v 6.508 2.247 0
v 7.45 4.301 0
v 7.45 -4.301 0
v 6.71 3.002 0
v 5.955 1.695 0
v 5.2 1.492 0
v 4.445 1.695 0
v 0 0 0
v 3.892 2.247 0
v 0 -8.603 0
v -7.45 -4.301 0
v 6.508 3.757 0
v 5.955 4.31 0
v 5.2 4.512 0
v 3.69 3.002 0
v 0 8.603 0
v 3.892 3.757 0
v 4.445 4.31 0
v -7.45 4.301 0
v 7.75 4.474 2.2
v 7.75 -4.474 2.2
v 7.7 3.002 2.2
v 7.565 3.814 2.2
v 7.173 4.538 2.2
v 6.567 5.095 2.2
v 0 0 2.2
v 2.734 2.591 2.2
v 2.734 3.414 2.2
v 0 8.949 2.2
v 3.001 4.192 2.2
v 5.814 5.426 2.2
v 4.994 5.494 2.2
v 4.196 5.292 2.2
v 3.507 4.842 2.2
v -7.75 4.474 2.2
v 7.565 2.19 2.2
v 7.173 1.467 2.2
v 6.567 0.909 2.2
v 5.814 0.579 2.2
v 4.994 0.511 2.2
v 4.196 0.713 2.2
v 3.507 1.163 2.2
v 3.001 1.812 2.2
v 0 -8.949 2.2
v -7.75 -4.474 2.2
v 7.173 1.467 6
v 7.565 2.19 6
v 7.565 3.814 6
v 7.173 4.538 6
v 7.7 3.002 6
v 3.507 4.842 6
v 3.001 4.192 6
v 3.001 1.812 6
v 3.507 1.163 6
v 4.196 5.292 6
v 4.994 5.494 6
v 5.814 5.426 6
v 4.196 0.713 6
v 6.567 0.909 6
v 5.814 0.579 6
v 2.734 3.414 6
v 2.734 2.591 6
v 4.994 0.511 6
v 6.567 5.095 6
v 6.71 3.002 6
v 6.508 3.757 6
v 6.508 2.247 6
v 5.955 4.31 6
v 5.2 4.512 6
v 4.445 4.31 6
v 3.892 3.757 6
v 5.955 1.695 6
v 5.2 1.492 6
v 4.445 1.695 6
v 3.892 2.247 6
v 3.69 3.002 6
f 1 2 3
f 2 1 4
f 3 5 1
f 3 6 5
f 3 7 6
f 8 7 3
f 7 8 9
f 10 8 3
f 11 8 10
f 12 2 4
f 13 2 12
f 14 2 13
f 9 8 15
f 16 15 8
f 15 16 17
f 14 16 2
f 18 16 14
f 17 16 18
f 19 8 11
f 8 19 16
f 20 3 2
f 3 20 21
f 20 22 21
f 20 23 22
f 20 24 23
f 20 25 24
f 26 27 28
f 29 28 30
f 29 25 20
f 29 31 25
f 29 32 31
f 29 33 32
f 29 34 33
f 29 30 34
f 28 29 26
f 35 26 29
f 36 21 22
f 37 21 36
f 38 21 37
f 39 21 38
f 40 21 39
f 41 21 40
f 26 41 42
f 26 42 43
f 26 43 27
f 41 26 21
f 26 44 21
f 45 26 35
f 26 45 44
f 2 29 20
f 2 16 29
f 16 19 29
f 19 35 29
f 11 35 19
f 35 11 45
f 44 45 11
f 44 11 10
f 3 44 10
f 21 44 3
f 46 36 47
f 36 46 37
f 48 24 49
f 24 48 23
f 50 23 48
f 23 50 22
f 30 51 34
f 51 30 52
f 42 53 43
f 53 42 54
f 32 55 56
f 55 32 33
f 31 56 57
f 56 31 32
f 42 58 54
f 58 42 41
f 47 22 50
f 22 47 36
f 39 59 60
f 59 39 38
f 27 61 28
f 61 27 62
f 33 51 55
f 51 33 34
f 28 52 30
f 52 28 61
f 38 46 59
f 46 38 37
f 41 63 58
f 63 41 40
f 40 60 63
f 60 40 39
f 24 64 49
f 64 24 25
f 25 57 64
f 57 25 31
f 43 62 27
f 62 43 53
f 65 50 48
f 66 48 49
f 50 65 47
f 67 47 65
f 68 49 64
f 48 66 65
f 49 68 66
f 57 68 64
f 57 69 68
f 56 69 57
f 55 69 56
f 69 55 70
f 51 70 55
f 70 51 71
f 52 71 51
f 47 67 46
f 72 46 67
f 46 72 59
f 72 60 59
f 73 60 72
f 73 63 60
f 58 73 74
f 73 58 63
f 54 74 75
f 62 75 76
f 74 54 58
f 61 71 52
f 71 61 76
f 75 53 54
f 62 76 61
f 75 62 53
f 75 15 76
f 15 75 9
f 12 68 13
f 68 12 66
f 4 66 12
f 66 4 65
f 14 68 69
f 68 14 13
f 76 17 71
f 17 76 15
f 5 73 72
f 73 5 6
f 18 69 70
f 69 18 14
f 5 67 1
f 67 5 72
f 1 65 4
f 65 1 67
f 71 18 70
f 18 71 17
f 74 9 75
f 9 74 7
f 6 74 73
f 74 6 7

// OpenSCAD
// file: ../Lib/HexGrid.scad
//Size of the hexagons, from one end to another
hexDiameter = 17.5;

//Height of the different pieces
hexHeight = 2.2;
hexMiddleHeight = 1.6;

//Thickness of a beam of the hex piece
beamThickness = 1;

//By how much should the polygon piece slope at the bottom layer?
hexPlay = 0.3;

//Generate a parenting node for the according hexagon
function hexNode(hexagon, height = hexHeight + hexMiddleHeight, rotation = 0) =
			//Translative coordinates
			[	[	hexDiameter * hexagon[0] + ((hexagon[1] % 2 != 0) ? hexDiameter/2 : 0),
					hexDiameter * sin(60) * hexagon[1],
					height],
			//Rotation coordinates
				[	0, 0, 60 * rotation] ];

module hexSegment(b2, t2, b1, t1, h) {
	fixDist = 0;

	render(convexity = 3)
	for(i=[0:5]) rotate([0, 0, i * 60])
	polyhedron(
		points = [	//Lower segments
					[b1, -tan(30) *b1, 0],	//0 - bottom left
					[b1,  tan(30) *b1, 0],	//1 - top left
					[b2,  tan(30) *b2, 0],	//2 - top right
					[b2, -tan(30) *b2, 0],	//3 - bottom right
					//Upper segments
					[t1, -tan(30 - fixDist) *t1, h],	//4 - bottom left
					[t1,  tan(30 - fixDist) *t1, h],	//5 - top left
					[t2,  tan(30 - fixDist) *t2, h],	//6 - top right
					[t2, -tan(30 - fixDist) *t2, h]],	//7 - bottom right
		faces = [
					[0, 3, 2, 1],	//Bottom face
					[4, 5, 6, 7],	//Top face
					[2, 3, 7, 6],	//Front face

					[0, 1, 5, 4],	//Back face

					[0, 4, 7, 3],	//Left face

					[1, 2, 6, 5]] );	//Right face
}

module lowerHex() {
	hexSegment(	hexDiameter /2 - beamThickness - hexPlay,
					hexDiameter /2 - beamThickness,
					hexDiameter /2 - beamThickness *2,
					hexDiameter /2 - beamThickness *2,
					hexHeight);
}

module lowerFill() {
	hexSegment(	 hexDiameter /2 - beamThickness - hexPlay,
					hexDiameter /2 - beamThickness,
					0.0001,
					0.0001,
					hexHeight);
}

module middleHex(aligned = true) {
	if(aligned)
		translate([0, 0, hexHeight]) middleHex(false);
	else
		hexSegment(	hexDiameter/2 - beamThickness,
						hexDiameter/2,
						hexDiameter/2 - beamThickness *2,
						hexDiameter/2 - beamThickness,
						hexMiddleHeight);
}

module upperHex(aligned = true) {
	if(aligned)
		translate([0, 0, hexHeight + hexMiddleHeight]) upperHex(false);
	else
		hexSegment(	hexDiameter/2,
						hexDiameter/2,
						hexDiameter/2 - beamThickness,
						hexDiameter/2 - beamThickness,
						hexHeight);
}

module hex() {
	lowerHex();
	middleHex();
	upperHex();
}

module hexPattern(i) {
	render() for(x=i) {
		if(x[1] % 2 != 0)
			translate([hexDiameter * x[0] + hexDiameter/2, x[1] * hexDiameter * sin(60)]) children();
		else
			translate([hexDiameter * x[0], x[1] * sin(60) * hexDiameter]) children();
	}
}
// main file
use <../Lib/HexGrid.scad>

hexFillRadius = 17.5 - 3;
hexFillHeight = 2.2;

module connectorHex() {
	lowerFill();
}

screwConnectorLength = 6;
screwConnectorThickness = 1;

lHexSize = 17.5 - 2.2 - 0.4;

inMovement = 4.5;

mountXPos = lHexSize /2 - sin(30) * (inMovement);
mountYPos = tan(30) * mountXPos;

module screwCylinder() {
	$fs = 0.85;
	difference() {
		union() {
			children();
			translate([mountXPos, mountYPos, 2]) cylinder(r = 3/2 + screwConnectorThickness, h= screwConnectorLength -2);
		}
		
		translate([mountXPos, mountYPos, 0]) cylinder(r= 3/2 + 0.01, h= screwConnectorLength);
	}
}

module sensorConnector() {
	screwCylinder()
	connectorHex();
}

sensorConnector();
